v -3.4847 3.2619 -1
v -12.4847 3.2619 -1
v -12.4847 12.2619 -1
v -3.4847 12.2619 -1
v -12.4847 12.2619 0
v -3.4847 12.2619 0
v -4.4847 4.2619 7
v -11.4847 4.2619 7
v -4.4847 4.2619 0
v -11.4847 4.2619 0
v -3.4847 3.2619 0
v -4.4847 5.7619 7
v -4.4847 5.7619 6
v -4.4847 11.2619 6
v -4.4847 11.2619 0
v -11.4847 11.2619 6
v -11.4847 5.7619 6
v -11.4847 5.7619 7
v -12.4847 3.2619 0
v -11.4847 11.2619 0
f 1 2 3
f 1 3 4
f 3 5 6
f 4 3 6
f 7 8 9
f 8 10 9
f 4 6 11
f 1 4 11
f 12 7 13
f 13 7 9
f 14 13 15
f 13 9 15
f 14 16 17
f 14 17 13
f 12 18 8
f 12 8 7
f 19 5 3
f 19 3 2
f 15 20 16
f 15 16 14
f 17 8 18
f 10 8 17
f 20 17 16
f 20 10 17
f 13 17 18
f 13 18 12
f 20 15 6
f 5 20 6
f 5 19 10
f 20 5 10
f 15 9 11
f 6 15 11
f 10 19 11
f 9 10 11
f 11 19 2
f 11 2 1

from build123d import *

# Parameters (mm, degrees)
F0_W     = 7
F0_H     = 7
F1_DEPTH = 6
F2_W     = 9
F2_H     = 9
F2_W_2   = 7
F2_H_2   = 7
F3_DEPTH = 1
F4_W     = 7
F4_H     = 1.5
F5_DEPTH = 1


with BuildPart() as f1:
    # F0 (on Top) → F1 (new body)
    with BuildSketch(Plane.XY):
        with Locations((-7.9846676588, 7.7618638836)):
            Rectangle(F0_W, F0_H)
    extrude(amount=F1_DEPTH)

    # F2 (on face) → F3 (join)
    with BuildSketch(Plane(origin=(0, 0, 0), x_dir=(1, 0, 0), z_dir=(0, 0, -1))):
        with Locations((-7.9846676588, -7.7618638836)):
            Rectangle(F2_W, F2_H)
        with Locations((-7.9846676588, -7.7618638836)):
            Rectangle(F2_W_2, F2_H_2, mode=Mode.SUBTRACT)
        with Locations((-7.9846676588, -7.7618638836)):
            Rectangle(F2_W_2, F2_H_2)
    extrude(amount=F3_DEPTH)

    # F4 (on face) → F5 (join)
    with BuildSketch(Plane.XY.offset(6)):
        with Locations((-7.9846676588, 5.0118638836)):
            Rectangle(F4_W, F4_H)
    extrude(amount=F5_DEPTH)


solid = f1.part
